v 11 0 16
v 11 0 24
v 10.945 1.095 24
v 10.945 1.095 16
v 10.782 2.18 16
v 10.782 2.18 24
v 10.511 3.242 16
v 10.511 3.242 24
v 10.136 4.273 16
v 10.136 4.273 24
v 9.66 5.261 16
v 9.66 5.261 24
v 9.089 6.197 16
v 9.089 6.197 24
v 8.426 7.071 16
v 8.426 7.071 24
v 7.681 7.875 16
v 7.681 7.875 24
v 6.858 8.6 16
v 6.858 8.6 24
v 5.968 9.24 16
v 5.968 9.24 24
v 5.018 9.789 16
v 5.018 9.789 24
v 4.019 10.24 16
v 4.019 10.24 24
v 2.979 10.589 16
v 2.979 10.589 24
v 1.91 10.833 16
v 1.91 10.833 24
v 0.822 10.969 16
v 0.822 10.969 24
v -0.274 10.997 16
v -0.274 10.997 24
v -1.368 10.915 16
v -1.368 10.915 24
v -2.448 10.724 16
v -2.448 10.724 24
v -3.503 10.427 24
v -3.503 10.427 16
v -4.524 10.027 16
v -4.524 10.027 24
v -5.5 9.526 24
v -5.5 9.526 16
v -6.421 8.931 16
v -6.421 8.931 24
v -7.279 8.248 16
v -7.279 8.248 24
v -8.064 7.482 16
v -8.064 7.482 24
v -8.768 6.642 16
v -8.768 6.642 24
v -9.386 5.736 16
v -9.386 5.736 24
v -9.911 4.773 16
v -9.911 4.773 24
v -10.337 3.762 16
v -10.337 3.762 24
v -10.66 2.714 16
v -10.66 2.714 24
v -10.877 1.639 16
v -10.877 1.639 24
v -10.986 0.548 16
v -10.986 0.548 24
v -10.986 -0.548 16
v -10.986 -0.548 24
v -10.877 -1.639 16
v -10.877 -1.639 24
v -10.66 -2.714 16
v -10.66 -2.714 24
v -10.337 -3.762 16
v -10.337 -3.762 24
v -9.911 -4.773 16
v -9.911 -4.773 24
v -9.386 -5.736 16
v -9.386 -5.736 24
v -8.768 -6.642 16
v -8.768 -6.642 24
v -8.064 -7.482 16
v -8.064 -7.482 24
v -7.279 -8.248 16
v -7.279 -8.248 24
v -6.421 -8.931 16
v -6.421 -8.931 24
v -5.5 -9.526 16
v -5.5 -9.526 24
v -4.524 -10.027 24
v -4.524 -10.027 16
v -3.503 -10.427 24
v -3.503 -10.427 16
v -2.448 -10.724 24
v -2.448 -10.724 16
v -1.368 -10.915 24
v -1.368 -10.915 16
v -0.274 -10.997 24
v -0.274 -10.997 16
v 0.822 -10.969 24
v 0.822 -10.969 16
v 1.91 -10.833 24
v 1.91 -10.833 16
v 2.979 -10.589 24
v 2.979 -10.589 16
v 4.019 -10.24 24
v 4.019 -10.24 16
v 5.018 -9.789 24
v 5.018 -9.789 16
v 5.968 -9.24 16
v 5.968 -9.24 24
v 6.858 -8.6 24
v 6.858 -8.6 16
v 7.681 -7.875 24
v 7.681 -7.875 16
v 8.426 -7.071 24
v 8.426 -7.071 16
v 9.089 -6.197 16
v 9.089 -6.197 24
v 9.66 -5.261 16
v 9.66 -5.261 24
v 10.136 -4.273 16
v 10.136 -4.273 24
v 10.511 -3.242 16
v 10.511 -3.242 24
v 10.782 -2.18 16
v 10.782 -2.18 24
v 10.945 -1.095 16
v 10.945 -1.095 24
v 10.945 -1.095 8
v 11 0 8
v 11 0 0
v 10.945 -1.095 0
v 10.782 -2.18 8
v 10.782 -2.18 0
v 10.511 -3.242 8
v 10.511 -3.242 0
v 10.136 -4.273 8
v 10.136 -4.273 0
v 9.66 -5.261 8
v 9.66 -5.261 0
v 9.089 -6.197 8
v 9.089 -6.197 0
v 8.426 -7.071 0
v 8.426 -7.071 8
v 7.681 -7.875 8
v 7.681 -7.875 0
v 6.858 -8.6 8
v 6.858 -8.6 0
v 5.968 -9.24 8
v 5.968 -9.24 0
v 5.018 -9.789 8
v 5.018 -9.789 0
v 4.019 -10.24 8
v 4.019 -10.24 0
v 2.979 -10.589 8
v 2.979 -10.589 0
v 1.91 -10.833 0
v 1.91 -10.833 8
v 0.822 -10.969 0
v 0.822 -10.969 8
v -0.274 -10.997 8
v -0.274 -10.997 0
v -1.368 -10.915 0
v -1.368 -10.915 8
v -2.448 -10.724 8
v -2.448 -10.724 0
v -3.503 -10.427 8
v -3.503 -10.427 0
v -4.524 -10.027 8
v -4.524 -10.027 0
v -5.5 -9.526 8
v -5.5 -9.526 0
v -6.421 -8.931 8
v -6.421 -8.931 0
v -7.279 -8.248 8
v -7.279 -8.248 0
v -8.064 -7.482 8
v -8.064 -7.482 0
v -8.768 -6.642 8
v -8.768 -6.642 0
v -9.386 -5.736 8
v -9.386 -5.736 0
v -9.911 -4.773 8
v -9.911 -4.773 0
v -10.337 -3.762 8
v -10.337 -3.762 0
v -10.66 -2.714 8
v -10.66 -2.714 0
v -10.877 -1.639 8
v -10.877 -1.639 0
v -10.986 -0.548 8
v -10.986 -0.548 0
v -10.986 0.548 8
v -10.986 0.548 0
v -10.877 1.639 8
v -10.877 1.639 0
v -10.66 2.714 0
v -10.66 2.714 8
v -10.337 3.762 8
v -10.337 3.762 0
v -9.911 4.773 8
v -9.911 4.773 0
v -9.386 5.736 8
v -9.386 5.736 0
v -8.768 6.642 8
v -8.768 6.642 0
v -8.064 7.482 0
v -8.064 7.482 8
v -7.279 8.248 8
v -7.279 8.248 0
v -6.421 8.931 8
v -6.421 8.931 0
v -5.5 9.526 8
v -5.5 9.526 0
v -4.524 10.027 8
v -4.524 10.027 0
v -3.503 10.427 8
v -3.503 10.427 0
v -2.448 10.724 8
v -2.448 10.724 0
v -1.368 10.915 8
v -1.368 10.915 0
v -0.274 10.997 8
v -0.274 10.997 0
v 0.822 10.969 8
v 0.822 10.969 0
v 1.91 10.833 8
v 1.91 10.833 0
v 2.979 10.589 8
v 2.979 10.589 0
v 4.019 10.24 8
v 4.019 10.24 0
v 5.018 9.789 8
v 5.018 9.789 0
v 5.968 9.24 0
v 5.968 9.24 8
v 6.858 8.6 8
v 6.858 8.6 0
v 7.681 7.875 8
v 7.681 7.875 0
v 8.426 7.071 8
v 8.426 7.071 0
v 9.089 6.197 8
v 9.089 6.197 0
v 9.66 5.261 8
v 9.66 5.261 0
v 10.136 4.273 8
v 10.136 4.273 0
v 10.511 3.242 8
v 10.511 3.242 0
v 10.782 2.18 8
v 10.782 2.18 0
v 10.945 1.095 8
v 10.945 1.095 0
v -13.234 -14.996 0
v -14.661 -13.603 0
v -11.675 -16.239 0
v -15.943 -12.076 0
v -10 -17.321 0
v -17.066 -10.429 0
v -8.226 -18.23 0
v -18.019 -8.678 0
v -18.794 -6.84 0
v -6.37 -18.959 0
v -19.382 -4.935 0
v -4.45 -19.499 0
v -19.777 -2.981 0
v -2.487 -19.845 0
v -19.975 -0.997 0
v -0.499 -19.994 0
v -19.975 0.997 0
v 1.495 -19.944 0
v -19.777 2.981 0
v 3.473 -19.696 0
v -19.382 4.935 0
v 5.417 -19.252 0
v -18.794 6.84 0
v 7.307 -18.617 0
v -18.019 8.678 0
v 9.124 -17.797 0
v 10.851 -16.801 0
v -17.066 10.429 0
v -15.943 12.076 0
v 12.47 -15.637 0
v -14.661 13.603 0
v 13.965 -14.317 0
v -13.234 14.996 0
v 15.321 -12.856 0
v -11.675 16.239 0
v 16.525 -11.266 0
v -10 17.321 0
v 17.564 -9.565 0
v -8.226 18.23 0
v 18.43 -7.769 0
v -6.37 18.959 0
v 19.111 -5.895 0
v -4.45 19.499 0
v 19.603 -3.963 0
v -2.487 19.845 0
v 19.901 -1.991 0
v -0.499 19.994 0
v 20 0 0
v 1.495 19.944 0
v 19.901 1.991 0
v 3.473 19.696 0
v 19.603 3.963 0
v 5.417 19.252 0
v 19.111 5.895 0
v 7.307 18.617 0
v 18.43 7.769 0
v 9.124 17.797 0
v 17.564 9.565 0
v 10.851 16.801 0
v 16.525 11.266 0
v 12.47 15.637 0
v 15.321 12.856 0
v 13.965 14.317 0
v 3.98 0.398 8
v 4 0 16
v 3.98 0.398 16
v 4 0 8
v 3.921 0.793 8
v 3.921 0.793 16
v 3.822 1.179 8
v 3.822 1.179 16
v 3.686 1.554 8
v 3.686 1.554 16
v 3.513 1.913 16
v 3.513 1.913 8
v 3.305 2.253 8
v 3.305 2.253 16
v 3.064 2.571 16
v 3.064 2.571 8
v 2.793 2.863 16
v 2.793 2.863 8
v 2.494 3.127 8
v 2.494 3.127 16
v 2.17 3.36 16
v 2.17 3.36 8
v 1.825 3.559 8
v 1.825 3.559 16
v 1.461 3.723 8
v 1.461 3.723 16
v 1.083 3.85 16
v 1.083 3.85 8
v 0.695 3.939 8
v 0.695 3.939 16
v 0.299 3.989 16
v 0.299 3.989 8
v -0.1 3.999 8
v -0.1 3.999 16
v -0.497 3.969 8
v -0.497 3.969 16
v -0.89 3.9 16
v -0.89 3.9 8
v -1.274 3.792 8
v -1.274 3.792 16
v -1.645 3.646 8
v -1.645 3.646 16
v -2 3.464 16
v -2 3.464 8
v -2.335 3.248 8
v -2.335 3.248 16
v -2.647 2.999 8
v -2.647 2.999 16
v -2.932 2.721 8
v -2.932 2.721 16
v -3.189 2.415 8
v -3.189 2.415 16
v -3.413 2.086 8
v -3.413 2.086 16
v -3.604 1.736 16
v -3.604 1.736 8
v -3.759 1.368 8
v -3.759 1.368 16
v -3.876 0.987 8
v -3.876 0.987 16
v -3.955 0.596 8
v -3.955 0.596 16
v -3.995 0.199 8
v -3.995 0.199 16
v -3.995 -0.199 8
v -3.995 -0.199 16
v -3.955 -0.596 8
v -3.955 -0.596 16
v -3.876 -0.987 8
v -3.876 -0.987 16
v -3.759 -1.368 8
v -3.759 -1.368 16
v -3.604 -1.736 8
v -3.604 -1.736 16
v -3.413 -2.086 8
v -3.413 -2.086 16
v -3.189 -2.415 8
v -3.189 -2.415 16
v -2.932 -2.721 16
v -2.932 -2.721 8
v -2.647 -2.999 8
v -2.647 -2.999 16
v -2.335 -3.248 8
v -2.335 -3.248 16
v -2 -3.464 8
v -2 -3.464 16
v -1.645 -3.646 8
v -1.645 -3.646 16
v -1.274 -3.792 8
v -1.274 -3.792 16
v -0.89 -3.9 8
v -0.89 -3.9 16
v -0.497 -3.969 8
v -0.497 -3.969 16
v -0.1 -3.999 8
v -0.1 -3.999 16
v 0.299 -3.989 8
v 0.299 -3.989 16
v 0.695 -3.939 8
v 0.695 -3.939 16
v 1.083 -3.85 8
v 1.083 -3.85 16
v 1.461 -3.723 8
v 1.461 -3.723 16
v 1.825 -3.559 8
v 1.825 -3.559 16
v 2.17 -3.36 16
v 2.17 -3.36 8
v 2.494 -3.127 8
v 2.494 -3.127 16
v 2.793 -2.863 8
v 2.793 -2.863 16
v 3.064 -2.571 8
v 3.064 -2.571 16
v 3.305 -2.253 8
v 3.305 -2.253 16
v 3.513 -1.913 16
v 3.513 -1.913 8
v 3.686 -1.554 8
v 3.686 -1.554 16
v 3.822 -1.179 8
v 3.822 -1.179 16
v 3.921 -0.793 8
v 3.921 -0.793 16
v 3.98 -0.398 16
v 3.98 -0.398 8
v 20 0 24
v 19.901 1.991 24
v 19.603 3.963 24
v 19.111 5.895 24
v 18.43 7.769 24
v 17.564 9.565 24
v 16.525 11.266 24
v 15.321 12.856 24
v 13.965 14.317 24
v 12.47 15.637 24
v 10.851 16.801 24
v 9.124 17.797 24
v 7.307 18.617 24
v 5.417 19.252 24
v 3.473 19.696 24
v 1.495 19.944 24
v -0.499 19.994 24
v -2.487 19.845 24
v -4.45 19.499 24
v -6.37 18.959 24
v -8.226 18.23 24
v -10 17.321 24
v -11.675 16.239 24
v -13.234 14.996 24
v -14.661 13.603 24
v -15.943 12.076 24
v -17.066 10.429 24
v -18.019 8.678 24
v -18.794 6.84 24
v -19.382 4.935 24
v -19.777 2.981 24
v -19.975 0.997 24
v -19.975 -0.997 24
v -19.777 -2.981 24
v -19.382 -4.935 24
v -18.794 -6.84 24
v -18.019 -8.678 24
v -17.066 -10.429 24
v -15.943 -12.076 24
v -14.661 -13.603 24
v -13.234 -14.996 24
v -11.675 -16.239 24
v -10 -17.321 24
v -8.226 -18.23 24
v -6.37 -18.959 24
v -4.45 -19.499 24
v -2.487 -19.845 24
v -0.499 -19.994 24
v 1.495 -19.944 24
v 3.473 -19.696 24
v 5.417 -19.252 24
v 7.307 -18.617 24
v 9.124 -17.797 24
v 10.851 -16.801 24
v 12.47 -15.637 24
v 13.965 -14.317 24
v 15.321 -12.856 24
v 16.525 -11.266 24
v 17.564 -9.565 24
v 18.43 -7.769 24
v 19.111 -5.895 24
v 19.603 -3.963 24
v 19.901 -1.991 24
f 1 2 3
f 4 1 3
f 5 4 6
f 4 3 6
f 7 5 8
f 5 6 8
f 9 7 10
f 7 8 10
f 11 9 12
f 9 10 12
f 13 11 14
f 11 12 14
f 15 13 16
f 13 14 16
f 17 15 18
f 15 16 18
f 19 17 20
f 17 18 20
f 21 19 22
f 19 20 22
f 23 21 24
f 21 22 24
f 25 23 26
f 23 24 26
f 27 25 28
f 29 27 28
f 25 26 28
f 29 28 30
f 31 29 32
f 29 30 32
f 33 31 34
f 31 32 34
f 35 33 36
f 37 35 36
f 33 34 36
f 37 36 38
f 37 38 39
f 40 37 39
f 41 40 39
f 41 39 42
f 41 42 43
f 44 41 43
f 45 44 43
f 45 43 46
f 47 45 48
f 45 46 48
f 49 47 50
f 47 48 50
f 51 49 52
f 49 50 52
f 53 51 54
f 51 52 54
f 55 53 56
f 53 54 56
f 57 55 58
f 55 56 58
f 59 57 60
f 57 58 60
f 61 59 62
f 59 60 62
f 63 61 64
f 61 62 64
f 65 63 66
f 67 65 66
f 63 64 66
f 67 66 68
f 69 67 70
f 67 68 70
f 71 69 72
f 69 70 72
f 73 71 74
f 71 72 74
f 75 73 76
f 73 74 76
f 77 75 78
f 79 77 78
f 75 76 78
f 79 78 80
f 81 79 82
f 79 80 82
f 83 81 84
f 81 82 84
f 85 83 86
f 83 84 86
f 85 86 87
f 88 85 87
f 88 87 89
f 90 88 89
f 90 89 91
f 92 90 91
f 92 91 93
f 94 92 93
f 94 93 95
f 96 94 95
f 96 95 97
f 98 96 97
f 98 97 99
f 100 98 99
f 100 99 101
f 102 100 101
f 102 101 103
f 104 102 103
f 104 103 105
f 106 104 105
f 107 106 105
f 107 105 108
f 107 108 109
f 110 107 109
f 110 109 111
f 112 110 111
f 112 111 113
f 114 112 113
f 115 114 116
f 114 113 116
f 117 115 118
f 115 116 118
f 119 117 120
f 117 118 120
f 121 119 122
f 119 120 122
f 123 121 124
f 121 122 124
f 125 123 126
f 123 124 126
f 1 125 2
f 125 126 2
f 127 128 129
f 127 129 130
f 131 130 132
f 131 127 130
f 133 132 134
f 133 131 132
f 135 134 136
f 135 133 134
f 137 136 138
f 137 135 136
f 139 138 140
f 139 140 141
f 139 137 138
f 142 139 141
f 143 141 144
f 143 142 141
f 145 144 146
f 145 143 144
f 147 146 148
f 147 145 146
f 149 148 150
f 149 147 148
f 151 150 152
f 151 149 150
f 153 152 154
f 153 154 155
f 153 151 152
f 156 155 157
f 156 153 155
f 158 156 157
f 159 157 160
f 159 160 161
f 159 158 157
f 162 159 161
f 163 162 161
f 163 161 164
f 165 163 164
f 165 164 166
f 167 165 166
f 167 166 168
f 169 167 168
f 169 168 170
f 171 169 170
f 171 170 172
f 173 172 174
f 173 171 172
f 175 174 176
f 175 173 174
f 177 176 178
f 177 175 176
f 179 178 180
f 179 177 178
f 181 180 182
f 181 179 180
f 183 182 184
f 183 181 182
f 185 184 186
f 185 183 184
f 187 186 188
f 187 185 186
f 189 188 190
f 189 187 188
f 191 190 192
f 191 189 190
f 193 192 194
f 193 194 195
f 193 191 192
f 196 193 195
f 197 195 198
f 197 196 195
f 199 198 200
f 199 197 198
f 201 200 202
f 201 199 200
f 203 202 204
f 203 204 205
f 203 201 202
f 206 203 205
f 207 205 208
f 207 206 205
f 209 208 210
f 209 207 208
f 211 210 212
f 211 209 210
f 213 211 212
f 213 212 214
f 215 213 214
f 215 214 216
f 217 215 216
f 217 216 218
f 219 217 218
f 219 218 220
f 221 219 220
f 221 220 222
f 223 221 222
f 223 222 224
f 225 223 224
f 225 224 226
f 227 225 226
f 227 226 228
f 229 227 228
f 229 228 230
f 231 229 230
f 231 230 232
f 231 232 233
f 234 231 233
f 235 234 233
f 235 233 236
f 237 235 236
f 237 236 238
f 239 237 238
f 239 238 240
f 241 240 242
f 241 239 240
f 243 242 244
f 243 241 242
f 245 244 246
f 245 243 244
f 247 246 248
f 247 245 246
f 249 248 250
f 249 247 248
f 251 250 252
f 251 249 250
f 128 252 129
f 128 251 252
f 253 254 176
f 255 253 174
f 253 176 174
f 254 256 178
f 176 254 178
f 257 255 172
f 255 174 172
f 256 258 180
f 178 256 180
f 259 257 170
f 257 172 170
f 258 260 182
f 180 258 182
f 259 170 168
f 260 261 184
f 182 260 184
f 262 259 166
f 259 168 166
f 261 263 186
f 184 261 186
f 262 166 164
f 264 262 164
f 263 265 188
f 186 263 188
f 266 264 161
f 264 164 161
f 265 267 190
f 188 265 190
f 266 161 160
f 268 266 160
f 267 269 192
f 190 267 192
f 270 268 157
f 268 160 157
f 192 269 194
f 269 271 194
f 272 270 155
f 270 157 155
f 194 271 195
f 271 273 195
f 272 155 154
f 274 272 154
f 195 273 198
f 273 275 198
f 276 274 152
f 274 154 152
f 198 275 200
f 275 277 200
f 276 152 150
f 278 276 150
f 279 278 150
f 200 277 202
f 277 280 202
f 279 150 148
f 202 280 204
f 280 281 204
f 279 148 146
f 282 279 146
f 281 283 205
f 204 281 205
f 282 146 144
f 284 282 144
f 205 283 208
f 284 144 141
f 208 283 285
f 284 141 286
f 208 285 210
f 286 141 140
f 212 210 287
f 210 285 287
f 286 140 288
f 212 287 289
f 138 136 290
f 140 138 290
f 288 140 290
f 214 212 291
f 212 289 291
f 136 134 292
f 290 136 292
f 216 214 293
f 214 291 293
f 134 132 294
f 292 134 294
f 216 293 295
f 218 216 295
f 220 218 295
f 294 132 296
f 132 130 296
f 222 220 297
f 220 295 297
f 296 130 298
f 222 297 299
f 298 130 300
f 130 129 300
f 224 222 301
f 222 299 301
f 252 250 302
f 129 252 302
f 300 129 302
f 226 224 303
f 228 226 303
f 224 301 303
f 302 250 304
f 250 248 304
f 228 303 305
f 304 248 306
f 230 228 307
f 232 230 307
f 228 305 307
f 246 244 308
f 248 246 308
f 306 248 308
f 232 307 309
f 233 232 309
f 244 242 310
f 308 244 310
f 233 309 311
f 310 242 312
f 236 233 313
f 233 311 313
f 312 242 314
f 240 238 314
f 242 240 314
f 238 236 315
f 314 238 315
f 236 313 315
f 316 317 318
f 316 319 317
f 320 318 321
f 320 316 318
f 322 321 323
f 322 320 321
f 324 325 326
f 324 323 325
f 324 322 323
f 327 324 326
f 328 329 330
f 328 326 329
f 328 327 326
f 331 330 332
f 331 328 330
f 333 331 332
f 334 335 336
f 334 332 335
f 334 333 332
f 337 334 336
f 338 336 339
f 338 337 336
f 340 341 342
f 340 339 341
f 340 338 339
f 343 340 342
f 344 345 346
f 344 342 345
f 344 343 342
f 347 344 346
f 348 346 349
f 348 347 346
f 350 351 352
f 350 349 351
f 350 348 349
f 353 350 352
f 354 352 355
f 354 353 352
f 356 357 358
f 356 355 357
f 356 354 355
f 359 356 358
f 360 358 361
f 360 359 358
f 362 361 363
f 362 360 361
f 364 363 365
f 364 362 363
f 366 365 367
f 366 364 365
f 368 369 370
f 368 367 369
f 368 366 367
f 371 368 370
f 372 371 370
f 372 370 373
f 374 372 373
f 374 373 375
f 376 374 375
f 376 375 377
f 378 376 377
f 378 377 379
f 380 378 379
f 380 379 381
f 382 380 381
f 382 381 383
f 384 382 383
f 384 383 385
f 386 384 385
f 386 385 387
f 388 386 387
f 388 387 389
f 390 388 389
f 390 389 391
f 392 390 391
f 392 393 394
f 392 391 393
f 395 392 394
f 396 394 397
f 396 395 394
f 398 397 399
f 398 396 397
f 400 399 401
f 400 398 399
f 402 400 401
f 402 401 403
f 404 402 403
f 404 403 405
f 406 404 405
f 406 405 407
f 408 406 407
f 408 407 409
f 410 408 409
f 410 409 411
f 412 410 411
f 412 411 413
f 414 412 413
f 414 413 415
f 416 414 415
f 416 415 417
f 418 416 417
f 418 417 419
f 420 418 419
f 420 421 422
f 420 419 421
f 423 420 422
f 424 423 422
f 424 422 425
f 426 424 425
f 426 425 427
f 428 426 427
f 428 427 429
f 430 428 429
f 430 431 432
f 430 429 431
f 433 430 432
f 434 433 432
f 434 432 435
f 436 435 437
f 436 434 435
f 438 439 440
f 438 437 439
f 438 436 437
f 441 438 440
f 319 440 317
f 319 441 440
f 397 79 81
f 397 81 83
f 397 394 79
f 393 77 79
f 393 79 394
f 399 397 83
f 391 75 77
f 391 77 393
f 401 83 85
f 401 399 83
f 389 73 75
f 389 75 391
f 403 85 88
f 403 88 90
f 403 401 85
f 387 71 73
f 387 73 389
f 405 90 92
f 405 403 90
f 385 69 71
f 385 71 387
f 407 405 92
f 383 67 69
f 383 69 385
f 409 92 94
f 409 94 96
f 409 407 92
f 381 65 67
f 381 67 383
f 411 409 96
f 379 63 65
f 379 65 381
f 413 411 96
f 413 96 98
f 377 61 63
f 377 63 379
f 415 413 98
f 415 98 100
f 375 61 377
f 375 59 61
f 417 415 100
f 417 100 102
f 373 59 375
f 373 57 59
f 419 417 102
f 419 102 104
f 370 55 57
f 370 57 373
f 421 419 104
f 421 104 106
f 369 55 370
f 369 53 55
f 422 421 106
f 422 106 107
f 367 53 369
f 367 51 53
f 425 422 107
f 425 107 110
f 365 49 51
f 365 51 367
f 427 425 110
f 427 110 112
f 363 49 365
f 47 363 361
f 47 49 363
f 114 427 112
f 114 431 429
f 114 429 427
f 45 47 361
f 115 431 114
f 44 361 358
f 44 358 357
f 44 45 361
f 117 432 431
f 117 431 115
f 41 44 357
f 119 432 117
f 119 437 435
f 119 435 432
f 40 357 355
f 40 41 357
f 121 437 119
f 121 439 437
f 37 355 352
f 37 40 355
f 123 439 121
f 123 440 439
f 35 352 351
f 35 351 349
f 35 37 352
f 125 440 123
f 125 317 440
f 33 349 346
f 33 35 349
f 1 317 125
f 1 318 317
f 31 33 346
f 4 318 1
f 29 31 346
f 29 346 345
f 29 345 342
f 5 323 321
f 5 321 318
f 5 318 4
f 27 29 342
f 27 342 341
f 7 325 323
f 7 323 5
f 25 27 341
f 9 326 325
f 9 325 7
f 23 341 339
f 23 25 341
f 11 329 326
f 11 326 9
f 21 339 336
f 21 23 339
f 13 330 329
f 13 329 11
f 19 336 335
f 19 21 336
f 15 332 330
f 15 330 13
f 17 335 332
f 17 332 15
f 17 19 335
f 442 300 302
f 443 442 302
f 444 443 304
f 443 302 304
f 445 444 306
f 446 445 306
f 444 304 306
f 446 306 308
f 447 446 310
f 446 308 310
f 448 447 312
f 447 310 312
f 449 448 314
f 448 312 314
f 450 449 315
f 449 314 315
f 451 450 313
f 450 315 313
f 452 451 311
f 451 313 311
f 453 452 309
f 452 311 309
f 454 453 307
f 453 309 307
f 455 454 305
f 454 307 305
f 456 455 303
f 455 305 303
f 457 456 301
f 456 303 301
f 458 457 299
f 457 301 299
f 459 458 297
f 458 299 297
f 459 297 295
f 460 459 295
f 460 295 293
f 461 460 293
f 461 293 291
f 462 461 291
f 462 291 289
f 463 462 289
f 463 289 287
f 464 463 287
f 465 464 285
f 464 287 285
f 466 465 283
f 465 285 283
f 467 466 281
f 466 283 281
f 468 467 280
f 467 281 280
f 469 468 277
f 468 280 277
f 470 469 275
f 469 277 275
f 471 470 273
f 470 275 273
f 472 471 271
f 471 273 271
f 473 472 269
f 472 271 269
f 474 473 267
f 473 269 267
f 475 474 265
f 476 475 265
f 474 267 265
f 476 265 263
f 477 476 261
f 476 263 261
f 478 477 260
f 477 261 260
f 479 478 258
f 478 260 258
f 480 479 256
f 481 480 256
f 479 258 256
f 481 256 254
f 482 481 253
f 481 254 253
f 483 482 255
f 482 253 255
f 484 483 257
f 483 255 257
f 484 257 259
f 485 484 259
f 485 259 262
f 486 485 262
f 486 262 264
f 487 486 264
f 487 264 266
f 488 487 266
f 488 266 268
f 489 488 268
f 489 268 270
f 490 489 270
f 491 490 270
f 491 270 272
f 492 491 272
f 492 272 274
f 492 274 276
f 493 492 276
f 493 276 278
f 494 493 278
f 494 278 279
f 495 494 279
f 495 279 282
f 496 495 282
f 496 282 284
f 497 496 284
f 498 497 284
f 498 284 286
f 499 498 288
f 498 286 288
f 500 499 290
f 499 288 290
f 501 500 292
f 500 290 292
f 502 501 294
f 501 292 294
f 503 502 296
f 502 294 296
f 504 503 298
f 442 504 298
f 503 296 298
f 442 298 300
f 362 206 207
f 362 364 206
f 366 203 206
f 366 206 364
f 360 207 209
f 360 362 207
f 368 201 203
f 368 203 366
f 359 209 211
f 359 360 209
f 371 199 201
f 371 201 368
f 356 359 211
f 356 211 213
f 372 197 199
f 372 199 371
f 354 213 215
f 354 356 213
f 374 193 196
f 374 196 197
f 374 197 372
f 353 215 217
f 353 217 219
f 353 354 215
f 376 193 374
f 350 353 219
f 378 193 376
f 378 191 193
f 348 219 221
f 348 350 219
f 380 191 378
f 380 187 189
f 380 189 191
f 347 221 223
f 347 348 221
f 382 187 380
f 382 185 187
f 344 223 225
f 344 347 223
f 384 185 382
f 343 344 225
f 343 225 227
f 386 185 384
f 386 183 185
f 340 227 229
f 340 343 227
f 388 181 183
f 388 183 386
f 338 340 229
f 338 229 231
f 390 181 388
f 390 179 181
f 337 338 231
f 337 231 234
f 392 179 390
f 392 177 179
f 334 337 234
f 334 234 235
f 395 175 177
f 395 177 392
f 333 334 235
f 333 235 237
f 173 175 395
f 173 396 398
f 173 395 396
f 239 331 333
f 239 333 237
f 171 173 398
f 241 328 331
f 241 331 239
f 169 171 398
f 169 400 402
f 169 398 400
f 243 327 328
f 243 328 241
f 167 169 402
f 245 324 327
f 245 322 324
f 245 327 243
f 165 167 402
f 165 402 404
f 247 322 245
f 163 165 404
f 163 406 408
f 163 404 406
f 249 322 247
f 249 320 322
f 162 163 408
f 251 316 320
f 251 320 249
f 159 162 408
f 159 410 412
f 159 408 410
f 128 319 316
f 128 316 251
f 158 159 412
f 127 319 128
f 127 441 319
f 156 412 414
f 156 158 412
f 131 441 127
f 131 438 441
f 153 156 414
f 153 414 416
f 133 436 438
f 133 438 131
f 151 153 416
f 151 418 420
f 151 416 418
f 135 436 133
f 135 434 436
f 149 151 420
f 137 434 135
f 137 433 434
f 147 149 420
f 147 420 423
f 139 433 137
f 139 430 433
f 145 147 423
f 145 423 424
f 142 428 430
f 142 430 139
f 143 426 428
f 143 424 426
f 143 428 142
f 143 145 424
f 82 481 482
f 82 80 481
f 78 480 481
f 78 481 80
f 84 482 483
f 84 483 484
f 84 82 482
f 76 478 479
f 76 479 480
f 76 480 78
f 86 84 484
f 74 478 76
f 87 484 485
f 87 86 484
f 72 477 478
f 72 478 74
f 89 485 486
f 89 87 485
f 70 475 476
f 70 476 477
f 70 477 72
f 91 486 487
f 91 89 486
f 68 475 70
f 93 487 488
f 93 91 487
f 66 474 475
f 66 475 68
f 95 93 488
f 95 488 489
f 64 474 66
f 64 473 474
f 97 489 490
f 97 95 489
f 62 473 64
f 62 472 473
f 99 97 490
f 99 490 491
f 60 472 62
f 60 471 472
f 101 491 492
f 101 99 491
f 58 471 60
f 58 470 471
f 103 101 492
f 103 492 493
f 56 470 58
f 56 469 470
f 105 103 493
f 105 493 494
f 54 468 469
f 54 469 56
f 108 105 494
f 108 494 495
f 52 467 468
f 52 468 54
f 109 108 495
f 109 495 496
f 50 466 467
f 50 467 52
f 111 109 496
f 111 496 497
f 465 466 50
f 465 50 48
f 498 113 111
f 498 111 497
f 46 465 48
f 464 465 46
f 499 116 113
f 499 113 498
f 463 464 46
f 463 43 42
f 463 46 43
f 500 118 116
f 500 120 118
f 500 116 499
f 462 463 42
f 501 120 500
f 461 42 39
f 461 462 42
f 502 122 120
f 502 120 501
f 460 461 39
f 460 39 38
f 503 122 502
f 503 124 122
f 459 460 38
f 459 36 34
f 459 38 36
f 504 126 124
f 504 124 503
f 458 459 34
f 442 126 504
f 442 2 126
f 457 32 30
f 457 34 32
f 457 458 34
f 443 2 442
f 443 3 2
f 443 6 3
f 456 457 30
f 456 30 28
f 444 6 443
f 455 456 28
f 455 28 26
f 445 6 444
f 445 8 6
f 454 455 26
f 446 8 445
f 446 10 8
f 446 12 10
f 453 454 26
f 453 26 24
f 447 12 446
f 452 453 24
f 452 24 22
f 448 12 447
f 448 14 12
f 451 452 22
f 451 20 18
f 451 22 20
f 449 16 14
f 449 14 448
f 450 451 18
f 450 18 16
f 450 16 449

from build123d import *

# Parameters (mm, degrees)
SKETCH1_R          = 20
SKETCH1_R_2        = 4
EXTRUDE1_DEPTH     = 24
SKETCH2_R          = 11
CUT_EXTRUDE1_DEPTH = 8
CUT_EXTRUDE2_START = -8
SKETCH3_R          = 11
CUT_EXTRUDE2_DEPTH = 8


with BuildPart() as part:
    # Sketch1 → Extrude1 (new body)
    with BuildSketch(Plane.XY):
        Circle(SKETCH1_R)
        Circle(SKETCH1_R_2, mode=Mode.SUBTRACT)
    extrude(amount=EXTRUDE1_DEPTH)

    # Sketch2 → Cut-Extrude1 (cut)
    with BuildSketch(Plane.XY.offset(24)):
        Circle(SKETCH2_R)
    extrude(amount=-CUT_EXTRUDE1_DEPTH, mode=Mode.SUBTRACT)

    # Sketch3 → Cut-Extrude2 (cut)
    with BuildSketch(Plane(origin=(0, 0, 0), x_dir=(-1, 0, 0), z_dir=(0, 0, -1)).offset(CUT_EXTRUDE2_START)):
        with Locations(Location((0, 0, 0), (0, 0, 180))):
            Circle(SKETCH3_R)
    extrude(amount=CUT_EXTRUDE2_DEPTH, mode=Mode.SUBTRACT)


solid = part.part
